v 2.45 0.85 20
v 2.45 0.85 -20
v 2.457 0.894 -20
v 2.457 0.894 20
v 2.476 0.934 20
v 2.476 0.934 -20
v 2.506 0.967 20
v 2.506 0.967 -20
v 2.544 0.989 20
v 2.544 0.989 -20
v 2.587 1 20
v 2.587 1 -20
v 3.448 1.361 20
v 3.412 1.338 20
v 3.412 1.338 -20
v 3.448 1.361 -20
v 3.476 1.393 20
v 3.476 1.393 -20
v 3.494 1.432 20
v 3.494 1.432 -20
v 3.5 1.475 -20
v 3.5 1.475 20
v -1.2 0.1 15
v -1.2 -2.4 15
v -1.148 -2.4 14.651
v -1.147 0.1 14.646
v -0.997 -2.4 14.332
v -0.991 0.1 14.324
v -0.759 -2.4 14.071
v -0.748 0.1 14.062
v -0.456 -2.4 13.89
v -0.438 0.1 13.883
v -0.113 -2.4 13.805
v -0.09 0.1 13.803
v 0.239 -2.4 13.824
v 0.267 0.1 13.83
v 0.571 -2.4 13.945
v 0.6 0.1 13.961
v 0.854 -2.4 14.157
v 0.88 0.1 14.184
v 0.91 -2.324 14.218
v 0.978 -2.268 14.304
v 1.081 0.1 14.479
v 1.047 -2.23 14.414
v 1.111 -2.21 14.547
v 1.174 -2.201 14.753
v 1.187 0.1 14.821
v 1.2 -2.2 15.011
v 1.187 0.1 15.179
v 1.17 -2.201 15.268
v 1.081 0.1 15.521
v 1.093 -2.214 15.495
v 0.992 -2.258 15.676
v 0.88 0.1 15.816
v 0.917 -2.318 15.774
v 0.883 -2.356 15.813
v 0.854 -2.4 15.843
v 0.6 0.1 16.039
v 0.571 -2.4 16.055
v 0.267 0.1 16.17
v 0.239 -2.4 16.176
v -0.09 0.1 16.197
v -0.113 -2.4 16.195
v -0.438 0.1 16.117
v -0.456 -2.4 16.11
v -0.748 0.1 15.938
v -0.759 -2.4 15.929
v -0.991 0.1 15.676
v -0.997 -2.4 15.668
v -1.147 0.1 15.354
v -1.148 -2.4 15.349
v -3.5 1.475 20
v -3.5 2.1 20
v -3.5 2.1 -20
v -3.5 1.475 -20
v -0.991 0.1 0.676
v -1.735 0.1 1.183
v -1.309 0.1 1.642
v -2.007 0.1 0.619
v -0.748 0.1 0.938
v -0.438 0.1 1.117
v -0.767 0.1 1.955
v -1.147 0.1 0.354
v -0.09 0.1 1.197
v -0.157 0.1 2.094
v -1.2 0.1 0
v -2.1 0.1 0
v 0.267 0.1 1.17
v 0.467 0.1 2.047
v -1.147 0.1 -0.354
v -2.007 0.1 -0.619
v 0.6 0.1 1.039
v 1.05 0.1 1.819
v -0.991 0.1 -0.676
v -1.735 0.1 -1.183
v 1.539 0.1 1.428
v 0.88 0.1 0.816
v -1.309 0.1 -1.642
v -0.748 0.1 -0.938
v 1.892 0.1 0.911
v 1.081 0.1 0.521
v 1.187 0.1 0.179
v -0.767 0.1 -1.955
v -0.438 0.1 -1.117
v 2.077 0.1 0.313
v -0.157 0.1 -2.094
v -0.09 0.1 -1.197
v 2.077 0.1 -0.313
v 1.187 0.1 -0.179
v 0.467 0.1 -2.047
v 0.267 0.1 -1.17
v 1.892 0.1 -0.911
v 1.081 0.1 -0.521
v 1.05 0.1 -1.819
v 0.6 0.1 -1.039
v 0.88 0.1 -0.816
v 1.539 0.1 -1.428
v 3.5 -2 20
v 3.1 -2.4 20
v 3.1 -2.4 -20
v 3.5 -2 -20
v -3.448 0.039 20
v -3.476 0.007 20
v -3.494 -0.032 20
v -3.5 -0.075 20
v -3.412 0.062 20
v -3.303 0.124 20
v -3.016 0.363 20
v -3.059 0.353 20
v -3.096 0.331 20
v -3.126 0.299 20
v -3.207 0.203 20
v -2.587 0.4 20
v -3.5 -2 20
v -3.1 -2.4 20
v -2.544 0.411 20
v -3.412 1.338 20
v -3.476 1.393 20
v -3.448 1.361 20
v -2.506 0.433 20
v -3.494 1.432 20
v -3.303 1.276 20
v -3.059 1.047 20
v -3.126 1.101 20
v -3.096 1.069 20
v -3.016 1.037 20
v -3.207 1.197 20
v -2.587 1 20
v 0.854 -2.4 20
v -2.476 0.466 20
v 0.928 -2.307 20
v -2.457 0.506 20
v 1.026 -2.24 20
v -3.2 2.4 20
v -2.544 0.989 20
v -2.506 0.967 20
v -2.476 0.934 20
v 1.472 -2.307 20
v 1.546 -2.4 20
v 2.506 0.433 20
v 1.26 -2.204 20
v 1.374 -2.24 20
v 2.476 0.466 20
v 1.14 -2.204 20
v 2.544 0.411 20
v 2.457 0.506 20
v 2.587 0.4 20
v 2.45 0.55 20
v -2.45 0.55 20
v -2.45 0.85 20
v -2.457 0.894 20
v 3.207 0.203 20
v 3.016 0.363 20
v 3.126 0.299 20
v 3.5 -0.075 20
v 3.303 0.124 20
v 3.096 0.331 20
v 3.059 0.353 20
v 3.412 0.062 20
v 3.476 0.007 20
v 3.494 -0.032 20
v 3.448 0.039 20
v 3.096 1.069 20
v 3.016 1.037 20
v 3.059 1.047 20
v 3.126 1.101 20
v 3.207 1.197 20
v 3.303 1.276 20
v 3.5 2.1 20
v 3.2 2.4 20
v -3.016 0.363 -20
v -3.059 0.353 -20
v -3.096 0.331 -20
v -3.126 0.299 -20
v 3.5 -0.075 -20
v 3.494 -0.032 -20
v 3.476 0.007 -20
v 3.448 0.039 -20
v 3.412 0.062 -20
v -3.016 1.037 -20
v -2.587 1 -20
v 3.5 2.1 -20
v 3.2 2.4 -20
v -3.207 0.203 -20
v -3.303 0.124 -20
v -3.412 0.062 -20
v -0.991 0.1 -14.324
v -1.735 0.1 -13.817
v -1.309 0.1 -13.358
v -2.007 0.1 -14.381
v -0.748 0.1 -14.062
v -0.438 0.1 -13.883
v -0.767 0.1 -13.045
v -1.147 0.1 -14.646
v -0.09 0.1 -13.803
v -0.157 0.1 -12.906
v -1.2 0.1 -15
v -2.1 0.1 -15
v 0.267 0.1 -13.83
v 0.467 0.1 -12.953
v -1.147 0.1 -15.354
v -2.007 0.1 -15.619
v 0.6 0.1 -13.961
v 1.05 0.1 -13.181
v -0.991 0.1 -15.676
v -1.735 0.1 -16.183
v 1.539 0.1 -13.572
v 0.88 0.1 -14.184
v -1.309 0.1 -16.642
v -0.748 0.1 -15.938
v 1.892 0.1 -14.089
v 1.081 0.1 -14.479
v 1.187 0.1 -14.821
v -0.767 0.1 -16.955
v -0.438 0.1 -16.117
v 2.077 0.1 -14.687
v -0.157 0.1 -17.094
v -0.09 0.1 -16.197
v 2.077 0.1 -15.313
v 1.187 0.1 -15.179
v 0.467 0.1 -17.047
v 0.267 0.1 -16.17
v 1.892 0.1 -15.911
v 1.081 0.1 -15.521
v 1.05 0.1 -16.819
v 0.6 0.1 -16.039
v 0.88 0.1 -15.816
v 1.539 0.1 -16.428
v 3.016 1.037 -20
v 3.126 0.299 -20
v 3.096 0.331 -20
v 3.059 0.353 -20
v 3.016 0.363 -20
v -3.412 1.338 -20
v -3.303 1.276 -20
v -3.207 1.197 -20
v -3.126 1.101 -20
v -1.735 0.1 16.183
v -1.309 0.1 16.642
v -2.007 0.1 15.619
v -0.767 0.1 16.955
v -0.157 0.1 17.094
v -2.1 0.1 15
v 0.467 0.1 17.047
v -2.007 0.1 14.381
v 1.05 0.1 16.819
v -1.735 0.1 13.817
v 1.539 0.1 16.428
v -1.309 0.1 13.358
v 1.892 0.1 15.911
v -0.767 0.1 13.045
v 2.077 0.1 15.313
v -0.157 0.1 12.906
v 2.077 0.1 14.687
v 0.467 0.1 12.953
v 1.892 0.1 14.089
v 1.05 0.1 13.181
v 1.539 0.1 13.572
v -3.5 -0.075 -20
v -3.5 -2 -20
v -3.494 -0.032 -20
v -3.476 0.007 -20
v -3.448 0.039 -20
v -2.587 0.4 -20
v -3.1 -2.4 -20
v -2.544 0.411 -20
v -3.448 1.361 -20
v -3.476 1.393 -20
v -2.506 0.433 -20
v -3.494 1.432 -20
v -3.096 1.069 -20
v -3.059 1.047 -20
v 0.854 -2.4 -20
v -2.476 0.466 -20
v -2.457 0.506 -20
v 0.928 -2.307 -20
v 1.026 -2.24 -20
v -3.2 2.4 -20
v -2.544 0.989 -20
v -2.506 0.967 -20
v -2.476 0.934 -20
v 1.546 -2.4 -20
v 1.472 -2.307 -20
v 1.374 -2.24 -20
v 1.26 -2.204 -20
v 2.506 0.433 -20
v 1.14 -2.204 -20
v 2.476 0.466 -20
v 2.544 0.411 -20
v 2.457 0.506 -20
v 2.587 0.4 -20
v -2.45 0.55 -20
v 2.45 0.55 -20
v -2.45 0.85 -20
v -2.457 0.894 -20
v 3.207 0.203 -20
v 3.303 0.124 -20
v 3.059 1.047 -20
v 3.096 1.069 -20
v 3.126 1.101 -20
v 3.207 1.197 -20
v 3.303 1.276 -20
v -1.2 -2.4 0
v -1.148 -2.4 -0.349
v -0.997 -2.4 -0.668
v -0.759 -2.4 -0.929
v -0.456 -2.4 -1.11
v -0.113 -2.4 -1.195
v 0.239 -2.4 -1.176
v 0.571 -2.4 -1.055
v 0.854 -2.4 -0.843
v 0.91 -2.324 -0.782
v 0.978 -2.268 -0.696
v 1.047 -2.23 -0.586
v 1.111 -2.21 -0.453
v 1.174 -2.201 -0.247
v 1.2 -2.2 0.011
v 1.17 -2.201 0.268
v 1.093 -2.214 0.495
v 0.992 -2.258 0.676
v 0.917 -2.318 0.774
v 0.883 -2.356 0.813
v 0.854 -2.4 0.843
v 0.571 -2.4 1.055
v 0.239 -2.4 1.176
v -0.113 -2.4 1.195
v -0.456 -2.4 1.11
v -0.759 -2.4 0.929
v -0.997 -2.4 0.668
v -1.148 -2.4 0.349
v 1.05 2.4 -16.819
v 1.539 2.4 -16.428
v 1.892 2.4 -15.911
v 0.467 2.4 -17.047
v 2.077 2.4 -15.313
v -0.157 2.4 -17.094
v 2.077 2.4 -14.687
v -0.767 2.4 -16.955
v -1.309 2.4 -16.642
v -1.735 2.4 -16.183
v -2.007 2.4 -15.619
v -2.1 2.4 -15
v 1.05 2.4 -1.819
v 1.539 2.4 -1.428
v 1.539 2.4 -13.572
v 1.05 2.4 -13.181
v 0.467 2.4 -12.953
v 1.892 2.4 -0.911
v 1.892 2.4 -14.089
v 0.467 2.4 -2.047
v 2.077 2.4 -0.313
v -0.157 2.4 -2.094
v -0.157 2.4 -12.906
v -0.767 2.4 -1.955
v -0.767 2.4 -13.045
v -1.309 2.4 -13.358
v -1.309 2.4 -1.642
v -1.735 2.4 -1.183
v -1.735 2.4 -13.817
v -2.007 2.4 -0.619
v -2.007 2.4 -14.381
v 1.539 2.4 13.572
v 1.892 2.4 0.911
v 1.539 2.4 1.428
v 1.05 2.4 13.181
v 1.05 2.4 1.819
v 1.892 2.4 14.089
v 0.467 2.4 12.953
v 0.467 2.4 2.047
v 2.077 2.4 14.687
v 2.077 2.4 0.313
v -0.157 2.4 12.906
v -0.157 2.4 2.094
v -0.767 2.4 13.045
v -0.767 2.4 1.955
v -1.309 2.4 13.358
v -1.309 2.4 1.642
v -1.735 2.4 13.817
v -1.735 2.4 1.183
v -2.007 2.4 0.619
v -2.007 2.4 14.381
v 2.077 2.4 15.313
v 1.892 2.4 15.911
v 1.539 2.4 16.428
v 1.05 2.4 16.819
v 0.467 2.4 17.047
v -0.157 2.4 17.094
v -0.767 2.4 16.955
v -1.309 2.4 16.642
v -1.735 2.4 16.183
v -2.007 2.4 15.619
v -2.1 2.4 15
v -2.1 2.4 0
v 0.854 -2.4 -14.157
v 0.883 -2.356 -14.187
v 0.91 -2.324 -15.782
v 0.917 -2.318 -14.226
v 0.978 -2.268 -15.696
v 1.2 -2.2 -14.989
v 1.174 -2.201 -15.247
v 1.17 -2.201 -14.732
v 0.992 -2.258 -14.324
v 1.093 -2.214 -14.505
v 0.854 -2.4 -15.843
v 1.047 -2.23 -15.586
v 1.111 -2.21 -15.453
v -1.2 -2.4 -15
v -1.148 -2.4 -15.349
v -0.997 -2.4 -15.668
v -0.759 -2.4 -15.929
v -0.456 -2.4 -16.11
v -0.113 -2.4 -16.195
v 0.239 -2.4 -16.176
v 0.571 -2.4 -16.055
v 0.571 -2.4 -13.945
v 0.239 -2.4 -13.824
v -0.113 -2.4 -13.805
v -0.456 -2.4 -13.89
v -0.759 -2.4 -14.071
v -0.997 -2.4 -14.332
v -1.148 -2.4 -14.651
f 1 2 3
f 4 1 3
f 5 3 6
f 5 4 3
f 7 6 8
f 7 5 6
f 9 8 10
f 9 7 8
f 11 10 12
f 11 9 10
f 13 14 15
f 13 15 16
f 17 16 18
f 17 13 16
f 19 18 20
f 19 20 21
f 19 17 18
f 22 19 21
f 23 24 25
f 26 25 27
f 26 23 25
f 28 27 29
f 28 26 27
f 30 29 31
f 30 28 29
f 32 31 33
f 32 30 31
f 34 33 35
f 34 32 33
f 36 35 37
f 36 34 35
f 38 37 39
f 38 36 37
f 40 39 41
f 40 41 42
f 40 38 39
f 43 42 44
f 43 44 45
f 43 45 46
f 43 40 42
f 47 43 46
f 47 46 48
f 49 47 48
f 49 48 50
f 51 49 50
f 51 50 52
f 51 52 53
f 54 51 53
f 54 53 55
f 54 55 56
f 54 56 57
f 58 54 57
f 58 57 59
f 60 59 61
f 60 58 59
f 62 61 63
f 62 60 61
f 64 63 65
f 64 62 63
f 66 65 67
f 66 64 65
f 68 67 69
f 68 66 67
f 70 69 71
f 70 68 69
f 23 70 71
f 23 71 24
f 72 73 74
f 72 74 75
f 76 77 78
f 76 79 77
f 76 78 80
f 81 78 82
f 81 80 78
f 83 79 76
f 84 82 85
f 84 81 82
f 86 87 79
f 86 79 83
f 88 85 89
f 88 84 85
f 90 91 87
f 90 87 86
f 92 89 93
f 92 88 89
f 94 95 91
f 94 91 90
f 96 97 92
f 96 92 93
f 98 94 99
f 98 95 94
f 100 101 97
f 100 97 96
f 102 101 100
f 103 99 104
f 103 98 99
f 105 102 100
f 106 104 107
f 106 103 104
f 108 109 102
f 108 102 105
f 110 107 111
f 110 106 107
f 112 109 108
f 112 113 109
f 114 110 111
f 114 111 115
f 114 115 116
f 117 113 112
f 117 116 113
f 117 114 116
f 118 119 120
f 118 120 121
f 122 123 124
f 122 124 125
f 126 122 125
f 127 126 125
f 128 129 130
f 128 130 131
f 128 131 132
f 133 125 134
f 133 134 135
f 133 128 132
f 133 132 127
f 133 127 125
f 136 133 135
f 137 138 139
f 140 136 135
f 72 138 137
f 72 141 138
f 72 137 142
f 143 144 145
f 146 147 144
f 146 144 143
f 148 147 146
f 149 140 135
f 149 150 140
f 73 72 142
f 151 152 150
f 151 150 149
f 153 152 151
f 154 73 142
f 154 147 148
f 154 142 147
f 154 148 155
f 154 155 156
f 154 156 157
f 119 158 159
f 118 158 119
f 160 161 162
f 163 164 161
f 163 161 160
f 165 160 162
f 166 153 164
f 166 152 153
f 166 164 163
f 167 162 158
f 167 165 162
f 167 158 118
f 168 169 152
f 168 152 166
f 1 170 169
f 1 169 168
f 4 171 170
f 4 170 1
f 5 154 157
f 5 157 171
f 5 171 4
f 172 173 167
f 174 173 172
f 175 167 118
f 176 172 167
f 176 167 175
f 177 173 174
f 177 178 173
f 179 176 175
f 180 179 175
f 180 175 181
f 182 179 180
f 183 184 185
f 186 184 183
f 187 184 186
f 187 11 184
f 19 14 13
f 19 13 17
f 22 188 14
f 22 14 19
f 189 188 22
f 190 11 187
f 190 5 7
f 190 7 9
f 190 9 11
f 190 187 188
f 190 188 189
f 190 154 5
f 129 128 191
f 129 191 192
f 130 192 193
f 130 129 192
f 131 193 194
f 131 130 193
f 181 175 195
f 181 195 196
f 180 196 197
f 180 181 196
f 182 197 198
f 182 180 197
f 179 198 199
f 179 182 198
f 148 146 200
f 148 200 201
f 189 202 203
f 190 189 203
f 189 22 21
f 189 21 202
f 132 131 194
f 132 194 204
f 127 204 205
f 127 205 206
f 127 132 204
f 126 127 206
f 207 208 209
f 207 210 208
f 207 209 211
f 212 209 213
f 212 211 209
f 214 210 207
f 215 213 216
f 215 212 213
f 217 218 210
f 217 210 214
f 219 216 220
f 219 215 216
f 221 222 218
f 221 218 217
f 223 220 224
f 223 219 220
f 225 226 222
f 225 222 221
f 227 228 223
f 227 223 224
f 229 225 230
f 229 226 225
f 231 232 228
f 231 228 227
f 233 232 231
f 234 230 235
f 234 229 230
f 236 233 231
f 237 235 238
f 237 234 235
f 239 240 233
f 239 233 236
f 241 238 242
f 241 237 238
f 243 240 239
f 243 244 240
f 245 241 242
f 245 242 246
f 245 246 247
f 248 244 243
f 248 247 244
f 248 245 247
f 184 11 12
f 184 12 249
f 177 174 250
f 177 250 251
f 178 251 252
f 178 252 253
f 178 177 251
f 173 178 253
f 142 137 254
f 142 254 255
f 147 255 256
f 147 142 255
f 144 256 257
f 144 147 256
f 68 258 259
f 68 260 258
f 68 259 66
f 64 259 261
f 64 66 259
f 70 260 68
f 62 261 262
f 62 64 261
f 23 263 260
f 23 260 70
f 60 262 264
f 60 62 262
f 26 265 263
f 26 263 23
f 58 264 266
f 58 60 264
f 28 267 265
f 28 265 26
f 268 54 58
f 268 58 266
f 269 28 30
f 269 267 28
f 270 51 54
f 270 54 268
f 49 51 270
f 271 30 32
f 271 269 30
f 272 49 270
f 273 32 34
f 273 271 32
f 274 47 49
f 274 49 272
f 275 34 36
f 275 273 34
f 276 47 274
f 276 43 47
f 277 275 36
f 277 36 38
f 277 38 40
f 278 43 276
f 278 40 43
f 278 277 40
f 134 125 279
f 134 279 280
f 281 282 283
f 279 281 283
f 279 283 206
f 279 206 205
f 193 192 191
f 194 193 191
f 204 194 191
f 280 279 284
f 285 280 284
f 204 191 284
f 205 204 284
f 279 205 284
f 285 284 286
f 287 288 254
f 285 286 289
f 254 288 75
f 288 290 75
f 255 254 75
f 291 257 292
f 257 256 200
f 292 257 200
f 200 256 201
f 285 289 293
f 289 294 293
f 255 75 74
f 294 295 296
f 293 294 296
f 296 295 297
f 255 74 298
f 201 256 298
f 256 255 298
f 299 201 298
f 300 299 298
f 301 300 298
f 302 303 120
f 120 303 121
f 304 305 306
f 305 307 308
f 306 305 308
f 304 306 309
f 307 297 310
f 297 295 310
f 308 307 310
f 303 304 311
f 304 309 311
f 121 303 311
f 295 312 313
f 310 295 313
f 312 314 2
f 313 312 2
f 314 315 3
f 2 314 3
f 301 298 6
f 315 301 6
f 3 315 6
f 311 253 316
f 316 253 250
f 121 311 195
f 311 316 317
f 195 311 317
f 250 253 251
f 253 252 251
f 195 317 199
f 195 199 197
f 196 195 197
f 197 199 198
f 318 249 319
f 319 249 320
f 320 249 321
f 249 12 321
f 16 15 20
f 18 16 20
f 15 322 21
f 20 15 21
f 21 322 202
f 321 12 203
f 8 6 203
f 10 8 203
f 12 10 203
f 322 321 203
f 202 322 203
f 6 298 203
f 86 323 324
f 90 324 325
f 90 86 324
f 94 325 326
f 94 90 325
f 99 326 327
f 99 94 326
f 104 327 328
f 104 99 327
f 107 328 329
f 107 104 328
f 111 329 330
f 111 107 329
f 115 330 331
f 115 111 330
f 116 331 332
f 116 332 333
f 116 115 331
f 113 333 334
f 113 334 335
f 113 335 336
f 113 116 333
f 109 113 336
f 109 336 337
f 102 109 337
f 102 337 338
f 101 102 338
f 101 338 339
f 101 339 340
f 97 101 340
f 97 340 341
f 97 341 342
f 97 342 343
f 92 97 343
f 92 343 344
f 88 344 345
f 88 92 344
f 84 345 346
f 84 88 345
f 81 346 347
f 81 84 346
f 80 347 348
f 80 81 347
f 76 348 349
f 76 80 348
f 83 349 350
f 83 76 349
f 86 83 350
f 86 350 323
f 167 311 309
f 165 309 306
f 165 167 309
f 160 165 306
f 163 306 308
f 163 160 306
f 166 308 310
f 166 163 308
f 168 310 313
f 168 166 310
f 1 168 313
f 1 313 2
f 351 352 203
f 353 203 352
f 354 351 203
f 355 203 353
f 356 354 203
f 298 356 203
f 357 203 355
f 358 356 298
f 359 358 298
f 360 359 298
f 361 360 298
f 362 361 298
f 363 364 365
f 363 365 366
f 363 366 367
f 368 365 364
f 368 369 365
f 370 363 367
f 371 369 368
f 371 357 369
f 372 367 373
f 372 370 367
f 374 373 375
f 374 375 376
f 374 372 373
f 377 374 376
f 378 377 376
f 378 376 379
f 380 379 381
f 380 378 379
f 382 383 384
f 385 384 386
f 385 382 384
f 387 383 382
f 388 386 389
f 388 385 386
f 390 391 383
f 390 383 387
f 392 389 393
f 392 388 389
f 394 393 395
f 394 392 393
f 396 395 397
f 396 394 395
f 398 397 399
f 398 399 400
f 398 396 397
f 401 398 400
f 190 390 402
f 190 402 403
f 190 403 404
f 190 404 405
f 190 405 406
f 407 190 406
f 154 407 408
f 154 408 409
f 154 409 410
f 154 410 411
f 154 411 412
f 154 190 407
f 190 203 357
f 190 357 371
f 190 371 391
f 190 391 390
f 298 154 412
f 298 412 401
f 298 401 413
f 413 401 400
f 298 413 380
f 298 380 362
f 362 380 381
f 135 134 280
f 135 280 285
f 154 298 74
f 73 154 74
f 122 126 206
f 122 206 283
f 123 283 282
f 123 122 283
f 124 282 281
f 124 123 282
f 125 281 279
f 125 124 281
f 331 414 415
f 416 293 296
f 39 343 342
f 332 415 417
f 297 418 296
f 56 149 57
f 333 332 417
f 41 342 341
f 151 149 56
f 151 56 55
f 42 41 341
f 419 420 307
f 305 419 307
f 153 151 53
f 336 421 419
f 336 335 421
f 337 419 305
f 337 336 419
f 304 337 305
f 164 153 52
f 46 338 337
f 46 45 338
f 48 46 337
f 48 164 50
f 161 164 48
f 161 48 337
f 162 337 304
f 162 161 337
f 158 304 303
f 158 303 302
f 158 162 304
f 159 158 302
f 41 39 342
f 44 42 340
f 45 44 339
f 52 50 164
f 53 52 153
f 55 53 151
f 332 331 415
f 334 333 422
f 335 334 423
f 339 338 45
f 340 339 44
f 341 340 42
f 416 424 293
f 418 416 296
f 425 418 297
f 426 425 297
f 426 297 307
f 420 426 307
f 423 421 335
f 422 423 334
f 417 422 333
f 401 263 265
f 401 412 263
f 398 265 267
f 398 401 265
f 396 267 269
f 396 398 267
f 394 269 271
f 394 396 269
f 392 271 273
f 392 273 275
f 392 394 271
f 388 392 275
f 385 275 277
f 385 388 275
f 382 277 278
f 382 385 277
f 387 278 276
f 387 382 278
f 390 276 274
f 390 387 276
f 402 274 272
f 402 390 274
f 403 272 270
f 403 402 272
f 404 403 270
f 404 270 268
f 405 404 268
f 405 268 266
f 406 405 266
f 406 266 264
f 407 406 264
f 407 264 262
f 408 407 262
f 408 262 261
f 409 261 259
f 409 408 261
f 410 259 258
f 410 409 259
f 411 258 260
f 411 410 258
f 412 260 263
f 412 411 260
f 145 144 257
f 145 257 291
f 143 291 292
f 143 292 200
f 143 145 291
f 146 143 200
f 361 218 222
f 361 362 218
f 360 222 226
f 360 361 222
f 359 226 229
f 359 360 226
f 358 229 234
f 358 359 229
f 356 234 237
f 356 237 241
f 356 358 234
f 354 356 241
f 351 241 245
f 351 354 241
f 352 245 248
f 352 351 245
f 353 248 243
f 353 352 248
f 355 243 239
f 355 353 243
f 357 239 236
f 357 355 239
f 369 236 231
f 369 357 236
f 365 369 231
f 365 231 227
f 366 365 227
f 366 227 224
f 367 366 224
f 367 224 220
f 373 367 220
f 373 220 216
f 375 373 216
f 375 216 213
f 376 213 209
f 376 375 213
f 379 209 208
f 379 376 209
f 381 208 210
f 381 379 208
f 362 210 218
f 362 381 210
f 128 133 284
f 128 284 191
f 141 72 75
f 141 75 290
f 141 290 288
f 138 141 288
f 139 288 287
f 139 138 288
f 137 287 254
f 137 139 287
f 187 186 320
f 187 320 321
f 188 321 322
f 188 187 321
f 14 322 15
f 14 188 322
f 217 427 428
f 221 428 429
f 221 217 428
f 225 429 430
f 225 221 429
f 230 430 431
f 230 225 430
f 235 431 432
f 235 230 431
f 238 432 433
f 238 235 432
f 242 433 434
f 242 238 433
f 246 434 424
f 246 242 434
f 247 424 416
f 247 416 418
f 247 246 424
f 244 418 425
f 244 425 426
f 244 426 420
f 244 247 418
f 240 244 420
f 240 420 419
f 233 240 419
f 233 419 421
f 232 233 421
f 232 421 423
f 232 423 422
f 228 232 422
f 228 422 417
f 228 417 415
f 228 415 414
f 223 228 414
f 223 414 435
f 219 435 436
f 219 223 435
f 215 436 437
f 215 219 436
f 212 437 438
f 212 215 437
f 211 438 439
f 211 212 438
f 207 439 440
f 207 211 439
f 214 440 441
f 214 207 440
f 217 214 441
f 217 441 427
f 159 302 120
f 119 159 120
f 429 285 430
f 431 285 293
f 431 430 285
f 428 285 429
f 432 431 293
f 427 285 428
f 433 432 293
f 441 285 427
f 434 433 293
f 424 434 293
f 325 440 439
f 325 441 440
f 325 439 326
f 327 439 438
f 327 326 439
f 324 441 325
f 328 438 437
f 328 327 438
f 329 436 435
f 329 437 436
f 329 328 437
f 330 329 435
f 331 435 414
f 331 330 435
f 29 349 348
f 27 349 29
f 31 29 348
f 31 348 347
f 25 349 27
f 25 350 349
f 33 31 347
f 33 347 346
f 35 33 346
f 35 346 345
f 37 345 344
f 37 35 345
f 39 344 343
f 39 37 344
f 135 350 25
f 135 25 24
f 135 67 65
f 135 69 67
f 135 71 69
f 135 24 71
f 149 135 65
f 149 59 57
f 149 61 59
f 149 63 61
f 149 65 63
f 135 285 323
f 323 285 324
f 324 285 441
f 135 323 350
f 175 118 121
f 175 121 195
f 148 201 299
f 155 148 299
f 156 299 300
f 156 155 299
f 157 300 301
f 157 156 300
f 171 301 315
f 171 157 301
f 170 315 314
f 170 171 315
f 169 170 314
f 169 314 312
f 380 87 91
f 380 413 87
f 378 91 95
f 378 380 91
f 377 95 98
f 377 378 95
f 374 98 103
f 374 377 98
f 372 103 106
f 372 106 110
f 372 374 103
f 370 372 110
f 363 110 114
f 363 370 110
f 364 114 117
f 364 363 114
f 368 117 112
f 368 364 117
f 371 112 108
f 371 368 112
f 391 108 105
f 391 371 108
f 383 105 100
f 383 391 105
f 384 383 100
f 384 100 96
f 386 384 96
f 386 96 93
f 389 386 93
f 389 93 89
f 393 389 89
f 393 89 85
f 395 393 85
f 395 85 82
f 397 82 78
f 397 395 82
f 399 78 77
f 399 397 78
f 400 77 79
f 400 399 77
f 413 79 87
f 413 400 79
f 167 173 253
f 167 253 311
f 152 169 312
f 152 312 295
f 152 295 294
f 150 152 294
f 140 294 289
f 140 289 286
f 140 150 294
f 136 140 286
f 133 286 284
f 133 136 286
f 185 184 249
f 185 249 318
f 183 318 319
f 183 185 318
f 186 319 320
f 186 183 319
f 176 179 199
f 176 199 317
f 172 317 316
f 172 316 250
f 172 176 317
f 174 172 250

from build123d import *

# Parameters (mm, degrees)
BOSS_EXTRUDE1_START = 20
BOSS_EXTRUDE1_DEPTH = 40
LPATTERN1_COUNT     = 3
LPATTERN1_PITCH     = 15


with BuildPart() as part:
    # Sketch3 → Boss-Extrude1 (new body)
    with BuildSketch(Plane.XY.offset(BOSS_EXTRUDE1_START)):
        with BuildLine():
            Line((-3.5, -0.074596669), (-3.5, -2))
            Line((-3.5, -2), (-3.1, -2.4))
            Line((-3.1, -2.4), (0.853589838, -2.4))
            ThreePointArc((0.853589838, -2.4), (1.2, -2.2), (1.546410162, -2.4))
            Line((1.546410162, -2.4), (3.1, -2.4))
            Line((3.1, -2.4), (3.5, -2))
            Line((3.5, -2), (3.5, -0.074596669))
            ThreePointArc((3.5, -0.074596669), (3.476025208, 0.006752252), (3.411764706, 0.062096861))
            ThreePointArc((3.411764706, 0.062096861), (3.252980354, 0.161322512), (3.126179073, 0.299089108))
            ThreePointArc((3.126179073, 0.299089108), (3.078284539, 0.343044682), (3.016290807, 0.362608836))
            Line((3.016290807, 0.362608836), (2.586926639, 0.400173333))
            ThreePointArc((2.586926639, 0.400173333), (2.489408399, 0.448264007), (2.45, 0.549602538))
            Line((2.45, 0.549602538), (2.45, 0.850397462))
            ThreePointArc((2.45, 0.850397462), (2.489408399, 0.951735993), (2.586926639, 0.999826667))
            Line((2.586926639, 0.999826667), (3.016290807, 1.037391164))
            ThreePointArc((3.016290807, 1.037391164), (3.078284539, 1.056955318), (3.126179073, 1.100910892))
            ThreePointArc((3.126179073, 1.100910892), (3.252980354, 1.238677488), (3.411764706, 1.337903139))
            ThreePointArc((3.411764706, 1.337903139), (3.476025208, 1.393247748), (3.5, 1.474596669))
            Line((3.5, 1.474596669), (3.5, 2.1))
            Line((3.5, 2.1), (3.2, 2.4))
            Line((3.2, 2.4), (-3.2, 2.4))
            Line((-3.2, 2.4), (-3.5, 2.1))
            Line((-3.5, 2.1), (-3.5, 1.474596669))
            ThreePointArc((-3.5, 1.474596669), (-3.476025208, 1.393247748), (-3.411764706, 1.337903139))
            ThreePointArc((-3.411764706, 1.337903139), (-3.252980354, 1.238677488), (-3.126179073, 1.100910892))
            ThreePointArc((-3.126179073, 1.100910892), (-3.078284539, 1.056955318), (-3.016290807, 1.037391164))
            Line((-3.016290807, 1.037391164), (-2.586926639, 0.999826667))
            ThreePointArc((-2.586926639, 0.999826667), (-2.489408399, 0.951735993), (-2.45, 0.850397462))
            Line((-2.45, 0.850397462), (-2.45, 0.549602538))
            ThreePointArc((-2.45, 0.549602538), (-2.489408399, 0.448264006), (-2.586926639, 0.400173333))
            Line((-2.586926639, 0.400173333), (-3.016290807, 0.362608836))
            ThreePointArc((-3.016290807, 0.362608836), (-3.078284539, 0.343044682), (-3.126179073, 0.299089108))
            ThreePointArc((-3.126179073, 0.299089108), (-3.252980354, 0.161322512), (-3.411764706, 0.062096861))
            ThreePointArc((-3.411764706, 0.062096861), (-3.476025208, 0.006752252), (-3.5, -0.074596669))
        make_face()
    extrude(amount=-BOSS_EXTRUDE1_DEPTH)

    # Sketch4 → Cut-Revolve1 (revolve, cut)
    with BuildSketch(Plane.XY.offset(15)):
        Polygon((0, 2.4), (0, -2.4), (-1.2, -2.4), (-1.2, 0.1), (-2.1, 0.1), (-2.1, 2.4), align=None)
    cut_revolve1 = revolve(axis=Axis((0, 2.4, 15), (0, -1, 0)), mode=Mode.SUBTRACT)

    # LPattern1: Cut-Revolve1 ×3
    with Locations(*[(0, 0, -i * LPATTERN1_PITCH) for i in range(1, LPATTERN1_COUNT)]):
        add(cut_revolve1, mode=Mode.SUBTRACT)


solid = part.part
